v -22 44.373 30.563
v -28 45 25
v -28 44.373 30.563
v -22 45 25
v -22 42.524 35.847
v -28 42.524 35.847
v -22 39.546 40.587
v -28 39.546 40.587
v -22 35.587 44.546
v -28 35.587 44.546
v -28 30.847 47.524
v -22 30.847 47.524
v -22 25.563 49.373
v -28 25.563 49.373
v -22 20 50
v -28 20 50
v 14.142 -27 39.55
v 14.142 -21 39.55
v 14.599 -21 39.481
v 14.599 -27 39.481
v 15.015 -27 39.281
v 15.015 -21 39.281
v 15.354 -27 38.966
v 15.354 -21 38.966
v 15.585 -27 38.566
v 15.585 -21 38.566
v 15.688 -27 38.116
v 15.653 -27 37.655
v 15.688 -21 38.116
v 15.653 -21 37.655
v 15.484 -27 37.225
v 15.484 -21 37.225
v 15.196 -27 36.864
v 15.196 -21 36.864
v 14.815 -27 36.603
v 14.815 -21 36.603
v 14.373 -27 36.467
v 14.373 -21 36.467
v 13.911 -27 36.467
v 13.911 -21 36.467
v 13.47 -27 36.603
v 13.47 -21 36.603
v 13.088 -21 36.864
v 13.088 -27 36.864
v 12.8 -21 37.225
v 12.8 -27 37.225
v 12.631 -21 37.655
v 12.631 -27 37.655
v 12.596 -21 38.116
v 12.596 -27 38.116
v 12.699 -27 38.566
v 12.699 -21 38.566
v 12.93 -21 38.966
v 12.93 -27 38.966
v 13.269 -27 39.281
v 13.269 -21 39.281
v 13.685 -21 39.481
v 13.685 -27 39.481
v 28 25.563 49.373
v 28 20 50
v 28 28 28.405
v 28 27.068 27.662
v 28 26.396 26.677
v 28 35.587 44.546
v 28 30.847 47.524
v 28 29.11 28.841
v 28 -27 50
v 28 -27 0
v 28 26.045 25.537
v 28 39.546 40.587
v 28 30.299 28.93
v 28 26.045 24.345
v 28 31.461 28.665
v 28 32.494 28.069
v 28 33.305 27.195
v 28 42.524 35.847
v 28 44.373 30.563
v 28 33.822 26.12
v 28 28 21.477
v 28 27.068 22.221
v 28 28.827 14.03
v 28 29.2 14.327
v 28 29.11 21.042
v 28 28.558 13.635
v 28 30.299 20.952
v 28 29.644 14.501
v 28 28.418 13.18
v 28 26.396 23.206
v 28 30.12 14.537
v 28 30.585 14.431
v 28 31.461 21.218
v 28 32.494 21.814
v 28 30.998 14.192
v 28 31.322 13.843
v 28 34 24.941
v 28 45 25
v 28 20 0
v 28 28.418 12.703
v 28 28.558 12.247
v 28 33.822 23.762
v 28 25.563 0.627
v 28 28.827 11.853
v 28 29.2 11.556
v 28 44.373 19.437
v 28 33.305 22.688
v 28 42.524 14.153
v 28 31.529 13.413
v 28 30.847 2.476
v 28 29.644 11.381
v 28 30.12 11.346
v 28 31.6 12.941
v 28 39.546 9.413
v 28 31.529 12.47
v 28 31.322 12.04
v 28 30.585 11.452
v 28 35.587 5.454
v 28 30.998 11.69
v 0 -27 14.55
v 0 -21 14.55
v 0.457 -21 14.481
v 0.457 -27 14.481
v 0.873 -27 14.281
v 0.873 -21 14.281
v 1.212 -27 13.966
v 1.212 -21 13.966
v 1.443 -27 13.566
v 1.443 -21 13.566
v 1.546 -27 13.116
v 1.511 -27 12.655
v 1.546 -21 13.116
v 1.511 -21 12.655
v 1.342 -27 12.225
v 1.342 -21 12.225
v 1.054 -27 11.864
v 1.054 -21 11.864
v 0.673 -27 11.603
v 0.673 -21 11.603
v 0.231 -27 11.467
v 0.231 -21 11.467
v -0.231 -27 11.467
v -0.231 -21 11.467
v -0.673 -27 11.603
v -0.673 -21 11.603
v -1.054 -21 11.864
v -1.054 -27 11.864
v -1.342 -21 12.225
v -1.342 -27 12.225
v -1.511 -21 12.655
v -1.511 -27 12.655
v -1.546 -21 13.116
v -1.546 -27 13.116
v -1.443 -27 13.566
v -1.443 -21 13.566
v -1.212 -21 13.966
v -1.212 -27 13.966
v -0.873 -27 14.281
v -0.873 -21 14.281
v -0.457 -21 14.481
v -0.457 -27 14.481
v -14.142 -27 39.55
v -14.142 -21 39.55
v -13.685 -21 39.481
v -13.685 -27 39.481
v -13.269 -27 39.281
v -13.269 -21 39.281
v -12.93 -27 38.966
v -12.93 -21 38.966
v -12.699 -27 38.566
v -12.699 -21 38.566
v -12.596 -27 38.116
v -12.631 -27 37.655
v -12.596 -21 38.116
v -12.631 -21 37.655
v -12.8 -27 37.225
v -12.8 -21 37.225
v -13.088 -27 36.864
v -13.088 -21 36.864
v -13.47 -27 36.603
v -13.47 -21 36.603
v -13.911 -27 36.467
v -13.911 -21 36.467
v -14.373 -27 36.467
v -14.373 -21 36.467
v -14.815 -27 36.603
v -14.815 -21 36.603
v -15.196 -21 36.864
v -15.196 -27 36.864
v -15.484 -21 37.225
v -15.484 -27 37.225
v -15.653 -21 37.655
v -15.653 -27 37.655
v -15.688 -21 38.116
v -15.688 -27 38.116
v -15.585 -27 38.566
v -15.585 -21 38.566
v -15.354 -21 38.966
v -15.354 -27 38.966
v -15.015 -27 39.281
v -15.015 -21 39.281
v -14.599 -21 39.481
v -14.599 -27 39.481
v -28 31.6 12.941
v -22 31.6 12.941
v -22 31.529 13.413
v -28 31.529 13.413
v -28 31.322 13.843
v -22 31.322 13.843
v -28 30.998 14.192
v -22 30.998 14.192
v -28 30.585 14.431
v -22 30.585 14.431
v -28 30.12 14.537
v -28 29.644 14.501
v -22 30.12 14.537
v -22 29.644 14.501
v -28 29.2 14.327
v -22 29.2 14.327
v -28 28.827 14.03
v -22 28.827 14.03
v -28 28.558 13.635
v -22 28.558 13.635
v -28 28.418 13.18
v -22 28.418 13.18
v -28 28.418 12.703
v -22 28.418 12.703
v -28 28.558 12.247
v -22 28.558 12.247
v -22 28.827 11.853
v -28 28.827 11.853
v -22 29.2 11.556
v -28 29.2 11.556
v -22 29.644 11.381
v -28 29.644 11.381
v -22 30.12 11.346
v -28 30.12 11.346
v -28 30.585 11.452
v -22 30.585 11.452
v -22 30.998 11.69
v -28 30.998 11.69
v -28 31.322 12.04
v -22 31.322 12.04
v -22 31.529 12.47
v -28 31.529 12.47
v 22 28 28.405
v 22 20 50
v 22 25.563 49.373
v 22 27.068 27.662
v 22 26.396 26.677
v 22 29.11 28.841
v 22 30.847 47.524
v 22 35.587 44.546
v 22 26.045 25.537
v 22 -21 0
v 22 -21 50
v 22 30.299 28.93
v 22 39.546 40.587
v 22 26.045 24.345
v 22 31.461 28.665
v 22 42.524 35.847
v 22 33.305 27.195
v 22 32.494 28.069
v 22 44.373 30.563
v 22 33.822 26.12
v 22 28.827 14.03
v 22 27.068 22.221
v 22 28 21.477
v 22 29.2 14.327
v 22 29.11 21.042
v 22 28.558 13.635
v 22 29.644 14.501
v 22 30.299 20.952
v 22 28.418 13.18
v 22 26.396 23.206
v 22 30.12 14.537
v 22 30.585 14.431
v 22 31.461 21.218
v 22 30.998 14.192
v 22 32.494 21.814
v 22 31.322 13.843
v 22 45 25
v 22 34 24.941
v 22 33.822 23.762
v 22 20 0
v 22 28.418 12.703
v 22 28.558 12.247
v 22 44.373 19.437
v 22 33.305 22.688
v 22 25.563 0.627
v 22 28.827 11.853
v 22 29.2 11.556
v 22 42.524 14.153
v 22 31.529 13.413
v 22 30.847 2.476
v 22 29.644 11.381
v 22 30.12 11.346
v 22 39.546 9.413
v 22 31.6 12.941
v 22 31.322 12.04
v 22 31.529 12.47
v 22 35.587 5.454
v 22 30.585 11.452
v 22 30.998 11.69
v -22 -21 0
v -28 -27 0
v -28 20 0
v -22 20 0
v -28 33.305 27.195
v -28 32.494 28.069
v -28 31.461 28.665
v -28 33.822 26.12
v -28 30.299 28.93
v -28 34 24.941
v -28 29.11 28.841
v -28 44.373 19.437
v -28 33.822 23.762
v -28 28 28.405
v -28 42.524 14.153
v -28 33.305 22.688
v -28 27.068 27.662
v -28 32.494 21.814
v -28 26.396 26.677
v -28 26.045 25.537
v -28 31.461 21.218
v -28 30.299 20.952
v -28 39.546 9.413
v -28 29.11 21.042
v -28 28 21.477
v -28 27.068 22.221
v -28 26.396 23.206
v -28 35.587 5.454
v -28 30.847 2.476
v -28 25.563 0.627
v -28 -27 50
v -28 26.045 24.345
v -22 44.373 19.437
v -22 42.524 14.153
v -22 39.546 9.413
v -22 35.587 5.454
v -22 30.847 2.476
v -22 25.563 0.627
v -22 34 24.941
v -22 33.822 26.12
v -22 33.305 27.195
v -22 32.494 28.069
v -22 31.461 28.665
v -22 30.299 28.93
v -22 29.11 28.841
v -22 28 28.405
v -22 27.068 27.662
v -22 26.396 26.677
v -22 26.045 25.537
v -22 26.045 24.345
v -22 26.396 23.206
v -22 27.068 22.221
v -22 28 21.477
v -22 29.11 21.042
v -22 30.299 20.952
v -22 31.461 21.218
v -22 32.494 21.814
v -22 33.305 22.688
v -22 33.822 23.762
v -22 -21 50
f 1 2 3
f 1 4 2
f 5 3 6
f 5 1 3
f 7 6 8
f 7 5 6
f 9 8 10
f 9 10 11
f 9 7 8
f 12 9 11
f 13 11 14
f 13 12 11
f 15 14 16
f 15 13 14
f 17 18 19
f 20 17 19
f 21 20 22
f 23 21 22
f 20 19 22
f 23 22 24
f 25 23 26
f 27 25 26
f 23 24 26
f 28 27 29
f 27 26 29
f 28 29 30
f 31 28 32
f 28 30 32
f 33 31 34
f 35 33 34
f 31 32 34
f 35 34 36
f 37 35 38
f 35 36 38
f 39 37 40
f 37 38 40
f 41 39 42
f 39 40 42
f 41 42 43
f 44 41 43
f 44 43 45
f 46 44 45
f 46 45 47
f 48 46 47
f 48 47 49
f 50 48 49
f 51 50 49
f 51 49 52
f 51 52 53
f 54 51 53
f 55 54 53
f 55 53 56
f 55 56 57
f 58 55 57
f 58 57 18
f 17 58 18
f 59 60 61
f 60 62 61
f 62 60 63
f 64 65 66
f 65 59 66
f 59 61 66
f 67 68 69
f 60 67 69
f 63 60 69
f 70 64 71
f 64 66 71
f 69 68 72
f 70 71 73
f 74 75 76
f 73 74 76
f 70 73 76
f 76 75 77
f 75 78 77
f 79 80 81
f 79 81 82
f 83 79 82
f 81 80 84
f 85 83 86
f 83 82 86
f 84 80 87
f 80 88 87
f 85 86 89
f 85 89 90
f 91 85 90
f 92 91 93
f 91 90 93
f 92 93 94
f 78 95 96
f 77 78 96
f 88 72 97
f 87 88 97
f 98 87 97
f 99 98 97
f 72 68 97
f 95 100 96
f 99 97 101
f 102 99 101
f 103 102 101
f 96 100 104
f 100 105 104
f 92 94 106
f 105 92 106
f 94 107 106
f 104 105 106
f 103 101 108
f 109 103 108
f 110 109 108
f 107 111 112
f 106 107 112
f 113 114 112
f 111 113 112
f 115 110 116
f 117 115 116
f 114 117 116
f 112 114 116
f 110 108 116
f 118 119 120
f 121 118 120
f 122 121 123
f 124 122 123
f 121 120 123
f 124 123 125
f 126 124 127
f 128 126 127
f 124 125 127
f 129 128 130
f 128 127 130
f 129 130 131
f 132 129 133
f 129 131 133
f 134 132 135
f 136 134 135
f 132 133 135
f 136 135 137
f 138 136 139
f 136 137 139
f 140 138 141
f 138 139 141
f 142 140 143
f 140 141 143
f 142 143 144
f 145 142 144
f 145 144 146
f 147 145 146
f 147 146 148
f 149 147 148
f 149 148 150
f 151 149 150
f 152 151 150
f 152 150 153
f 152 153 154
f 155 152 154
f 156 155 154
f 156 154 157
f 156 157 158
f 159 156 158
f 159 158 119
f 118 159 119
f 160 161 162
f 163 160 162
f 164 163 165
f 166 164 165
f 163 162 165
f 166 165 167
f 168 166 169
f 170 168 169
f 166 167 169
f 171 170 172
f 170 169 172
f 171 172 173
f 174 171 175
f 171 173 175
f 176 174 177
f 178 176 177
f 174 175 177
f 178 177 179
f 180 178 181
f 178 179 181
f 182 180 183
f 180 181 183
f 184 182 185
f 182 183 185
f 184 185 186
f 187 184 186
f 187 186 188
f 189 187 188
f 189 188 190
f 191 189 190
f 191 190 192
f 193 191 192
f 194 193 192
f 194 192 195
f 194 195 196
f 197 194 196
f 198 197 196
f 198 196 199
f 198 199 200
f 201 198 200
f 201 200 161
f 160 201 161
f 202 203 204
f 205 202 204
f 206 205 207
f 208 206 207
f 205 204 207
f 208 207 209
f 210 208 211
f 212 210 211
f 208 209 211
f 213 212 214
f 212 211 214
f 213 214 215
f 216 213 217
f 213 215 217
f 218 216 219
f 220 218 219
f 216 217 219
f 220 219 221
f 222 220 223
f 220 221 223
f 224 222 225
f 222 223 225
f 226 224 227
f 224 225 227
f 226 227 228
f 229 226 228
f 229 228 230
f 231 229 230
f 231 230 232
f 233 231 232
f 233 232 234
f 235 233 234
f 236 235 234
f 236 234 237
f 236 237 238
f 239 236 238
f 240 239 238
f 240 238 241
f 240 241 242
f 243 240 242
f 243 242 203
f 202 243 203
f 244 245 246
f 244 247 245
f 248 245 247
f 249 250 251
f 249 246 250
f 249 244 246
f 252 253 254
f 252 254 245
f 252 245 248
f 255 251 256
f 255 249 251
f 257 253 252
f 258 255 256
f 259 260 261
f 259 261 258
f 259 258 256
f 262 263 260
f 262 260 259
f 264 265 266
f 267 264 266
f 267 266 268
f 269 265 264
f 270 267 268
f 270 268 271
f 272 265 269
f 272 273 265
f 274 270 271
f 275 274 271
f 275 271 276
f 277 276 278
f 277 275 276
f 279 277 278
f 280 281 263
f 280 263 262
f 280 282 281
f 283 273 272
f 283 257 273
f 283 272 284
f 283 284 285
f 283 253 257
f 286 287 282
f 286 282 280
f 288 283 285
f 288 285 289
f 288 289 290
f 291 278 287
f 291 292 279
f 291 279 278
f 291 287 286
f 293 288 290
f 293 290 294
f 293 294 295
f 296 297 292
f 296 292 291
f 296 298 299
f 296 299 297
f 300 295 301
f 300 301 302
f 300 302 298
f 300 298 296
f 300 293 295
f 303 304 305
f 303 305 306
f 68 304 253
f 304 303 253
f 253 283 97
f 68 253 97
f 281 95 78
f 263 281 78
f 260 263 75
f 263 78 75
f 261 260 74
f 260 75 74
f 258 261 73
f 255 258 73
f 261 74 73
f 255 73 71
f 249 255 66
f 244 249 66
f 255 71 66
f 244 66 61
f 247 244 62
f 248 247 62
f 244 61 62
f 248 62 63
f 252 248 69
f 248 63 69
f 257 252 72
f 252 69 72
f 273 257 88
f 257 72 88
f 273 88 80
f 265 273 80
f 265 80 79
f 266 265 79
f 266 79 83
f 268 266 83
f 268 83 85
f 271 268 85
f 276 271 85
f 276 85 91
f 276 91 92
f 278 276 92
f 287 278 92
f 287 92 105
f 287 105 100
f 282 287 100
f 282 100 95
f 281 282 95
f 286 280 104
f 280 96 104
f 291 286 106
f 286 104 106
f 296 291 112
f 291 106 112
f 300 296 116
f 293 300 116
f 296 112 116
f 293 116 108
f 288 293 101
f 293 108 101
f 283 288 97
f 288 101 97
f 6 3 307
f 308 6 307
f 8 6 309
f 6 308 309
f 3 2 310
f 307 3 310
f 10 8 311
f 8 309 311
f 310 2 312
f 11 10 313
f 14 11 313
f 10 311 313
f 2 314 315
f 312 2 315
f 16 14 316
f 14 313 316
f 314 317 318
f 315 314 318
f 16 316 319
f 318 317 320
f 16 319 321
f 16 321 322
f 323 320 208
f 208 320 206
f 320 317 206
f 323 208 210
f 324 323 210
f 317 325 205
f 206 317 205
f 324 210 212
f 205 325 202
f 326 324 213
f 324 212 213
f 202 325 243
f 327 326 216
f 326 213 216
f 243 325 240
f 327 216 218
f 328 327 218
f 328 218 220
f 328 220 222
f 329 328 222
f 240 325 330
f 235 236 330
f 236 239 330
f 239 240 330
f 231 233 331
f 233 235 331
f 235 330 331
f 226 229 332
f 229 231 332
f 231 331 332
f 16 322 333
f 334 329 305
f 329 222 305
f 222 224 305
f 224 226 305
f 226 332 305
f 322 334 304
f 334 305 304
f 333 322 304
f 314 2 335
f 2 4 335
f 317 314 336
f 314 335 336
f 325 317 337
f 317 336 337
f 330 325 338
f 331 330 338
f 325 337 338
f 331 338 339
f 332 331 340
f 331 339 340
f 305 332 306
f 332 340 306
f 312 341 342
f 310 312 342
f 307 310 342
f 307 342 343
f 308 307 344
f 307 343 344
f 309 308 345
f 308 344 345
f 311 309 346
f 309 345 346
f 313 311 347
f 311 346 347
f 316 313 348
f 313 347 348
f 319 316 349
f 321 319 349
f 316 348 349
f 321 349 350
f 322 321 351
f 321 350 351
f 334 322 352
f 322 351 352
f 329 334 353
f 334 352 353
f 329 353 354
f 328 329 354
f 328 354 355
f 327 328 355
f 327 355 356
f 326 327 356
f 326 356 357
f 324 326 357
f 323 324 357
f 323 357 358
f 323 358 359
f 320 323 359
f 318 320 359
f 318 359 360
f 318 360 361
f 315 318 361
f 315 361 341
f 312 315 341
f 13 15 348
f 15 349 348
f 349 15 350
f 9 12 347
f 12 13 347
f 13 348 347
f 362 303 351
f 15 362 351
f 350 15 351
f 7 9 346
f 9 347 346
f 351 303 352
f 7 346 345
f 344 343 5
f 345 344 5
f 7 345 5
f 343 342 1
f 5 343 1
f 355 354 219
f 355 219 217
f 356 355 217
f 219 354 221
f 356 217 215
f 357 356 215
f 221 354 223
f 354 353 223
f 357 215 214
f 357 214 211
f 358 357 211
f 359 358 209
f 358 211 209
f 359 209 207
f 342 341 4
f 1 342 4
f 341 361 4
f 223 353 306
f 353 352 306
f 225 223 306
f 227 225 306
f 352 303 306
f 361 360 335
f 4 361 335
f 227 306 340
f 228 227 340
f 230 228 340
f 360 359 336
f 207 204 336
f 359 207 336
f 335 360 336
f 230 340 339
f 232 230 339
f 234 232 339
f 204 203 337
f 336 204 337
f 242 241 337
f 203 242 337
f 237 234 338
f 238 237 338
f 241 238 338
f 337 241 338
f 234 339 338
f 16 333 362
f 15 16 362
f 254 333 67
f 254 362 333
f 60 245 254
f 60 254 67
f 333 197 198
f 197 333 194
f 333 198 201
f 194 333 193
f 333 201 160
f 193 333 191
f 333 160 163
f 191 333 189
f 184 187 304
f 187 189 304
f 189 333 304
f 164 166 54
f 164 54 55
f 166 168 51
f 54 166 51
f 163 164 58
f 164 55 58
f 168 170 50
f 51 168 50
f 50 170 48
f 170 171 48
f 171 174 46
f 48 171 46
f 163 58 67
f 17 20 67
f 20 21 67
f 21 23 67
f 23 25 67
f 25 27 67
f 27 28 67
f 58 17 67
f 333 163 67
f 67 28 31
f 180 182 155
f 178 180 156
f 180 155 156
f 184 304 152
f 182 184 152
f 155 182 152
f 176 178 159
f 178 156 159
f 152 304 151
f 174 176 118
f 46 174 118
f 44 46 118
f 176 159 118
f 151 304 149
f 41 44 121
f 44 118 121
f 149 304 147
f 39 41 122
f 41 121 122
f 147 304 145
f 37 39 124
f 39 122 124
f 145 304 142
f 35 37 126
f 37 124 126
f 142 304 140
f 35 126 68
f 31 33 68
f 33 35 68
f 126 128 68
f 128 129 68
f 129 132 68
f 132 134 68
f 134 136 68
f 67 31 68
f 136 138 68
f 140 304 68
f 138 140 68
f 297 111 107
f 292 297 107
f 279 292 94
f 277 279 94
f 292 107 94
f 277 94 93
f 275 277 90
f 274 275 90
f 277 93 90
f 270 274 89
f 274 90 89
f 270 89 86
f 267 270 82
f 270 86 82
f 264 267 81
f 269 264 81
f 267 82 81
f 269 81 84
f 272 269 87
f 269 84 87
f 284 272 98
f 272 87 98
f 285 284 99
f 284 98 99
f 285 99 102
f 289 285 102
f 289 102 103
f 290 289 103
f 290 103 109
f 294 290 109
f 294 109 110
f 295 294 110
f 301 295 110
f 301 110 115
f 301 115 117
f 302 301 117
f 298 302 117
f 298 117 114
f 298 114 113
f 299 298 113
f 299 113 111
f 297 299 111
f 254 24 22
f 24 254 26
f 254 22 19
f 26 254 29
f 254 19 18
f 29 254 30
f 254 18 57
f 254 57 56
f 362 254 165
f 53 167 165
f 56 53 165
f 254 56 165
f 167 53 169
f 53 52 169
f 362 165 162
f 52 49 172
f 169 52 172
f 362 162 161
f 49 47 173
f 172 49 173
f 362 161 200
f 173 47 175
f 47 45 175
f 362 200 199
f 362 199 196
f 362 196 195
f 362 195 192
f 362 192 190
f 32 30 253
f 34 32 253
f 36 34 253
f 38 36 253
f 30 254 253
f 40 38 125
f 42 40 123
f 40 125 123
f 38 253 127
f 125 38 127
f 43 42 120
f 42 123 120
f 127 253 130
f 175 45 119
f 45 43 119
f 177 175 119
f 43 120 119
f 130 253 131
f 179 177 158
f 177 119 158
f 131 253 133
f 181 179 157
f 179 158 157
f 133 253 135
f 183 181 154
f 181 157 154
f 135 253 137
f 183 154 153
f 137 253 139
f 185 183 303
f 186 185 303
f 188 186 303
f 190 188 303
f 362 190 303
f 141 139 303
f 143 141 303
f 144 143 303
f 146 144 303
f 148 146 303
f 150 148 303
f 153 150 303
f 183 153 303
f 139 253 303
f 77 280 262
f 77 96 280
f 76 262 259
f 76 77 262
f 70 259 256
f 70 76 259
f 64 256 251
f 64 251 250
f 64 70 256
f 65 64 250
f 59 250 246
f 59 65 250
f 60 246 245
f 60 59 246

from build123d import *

# Parameters (mm, degrees)
SKETCH1_W           = 6
SKETCH1_H           = 66
SKETCH1_W_2         = 44
SKETCH1_H_2         = 6
BOSS_EXTRUDE1_DEPTH = 50
FILLET1_R           = 25
SKETCH3_R           = 1.6
SKETCH3_R_2         = 4
CUT_EXTRUDE2_DEPTH  = 88.527138649
SKETCH4_R           = 1.55
CUT_EXTRUDE3_DEPTH  = 88.407093534


with BuildPart() as part:
    # Sketch1 → Boss-Extrude1 (new body)
    with BuildSketch(Plane.XY):
        with Locations((-25, 12)):
            Rectangle(SKETCH1_W, SKETCH1_H)
        with Locations((0, -24)):
            Rectangle(SKETCH1_W_2, SKETCH1_H_2)
        with Locations((-25, -24)):
            Rectangle(SKETCH1_W, SKETCH1_H_2)
        with Locations((25, -24)):
            Rectangle(SKETCH1_W, SKETCH1_H_2)
        with Locations((25, 12)):
            Rectangle(SKETCH1_W, SKETCH1_H)
    extrude(amount=BOSS_EXTRUDE1_DEPTH)

    # Fillet1
    fillet1_edges = [part.edges().sort_by_distance(p)[0] for p in [
        (-25, 45, 50),
        (-25, 45, 0),
        (25, 45, 0),
        (25, 45, 50),
    ]]
    fillet(fillet1_edges, radius=FILLET1_R - 0.0001)  # a hair under: the kernel refuses the full size

    # Sketch3 → Cut-Extrude2 (cut, through all)
    with BuildSketch(Plane(origin=(28, 0, 0), x_dir=(0, 0, -1), z_dir=(1, 0, 0))):
        with Locations(Location((-12.941245902, 30, 0), (0, 0, 90))):
            Circle(SKETCH3_R)
        with Locations(Location((-24.941245902, 30, 0), (0, 0, 90))):
            Circle(SKETCH3_R_2)
    extrude(amount=-CUT_EXTRUDE2_DEPTH, mode=Mode.SUBTRACT)

    # Sketch4 → Cut-Extrude3 (cut, through all)
    with BuildSketch(Plane(origin=(0, -21, 0), x_dir=(1, 0, 0), z_dir=(0, 1, 0))):
        with Locations(Location((-14.142135624, -38, 0), (0, 0, 270))):
            Circle(SKETCH4_R)
        with Locations(Location((14.142135624, -38, 0), (0, 0, 270))):
            Circle(SKETCH4_R)
        with Locations(Location((0, -13, 0), (0, 0, 270))):
            Circle(SKETCH4_R)
    extrude(amount=-CUT_EXTRUDE3_DEPTH, mode=Mode.SUBTRACT)


solid = part.part
